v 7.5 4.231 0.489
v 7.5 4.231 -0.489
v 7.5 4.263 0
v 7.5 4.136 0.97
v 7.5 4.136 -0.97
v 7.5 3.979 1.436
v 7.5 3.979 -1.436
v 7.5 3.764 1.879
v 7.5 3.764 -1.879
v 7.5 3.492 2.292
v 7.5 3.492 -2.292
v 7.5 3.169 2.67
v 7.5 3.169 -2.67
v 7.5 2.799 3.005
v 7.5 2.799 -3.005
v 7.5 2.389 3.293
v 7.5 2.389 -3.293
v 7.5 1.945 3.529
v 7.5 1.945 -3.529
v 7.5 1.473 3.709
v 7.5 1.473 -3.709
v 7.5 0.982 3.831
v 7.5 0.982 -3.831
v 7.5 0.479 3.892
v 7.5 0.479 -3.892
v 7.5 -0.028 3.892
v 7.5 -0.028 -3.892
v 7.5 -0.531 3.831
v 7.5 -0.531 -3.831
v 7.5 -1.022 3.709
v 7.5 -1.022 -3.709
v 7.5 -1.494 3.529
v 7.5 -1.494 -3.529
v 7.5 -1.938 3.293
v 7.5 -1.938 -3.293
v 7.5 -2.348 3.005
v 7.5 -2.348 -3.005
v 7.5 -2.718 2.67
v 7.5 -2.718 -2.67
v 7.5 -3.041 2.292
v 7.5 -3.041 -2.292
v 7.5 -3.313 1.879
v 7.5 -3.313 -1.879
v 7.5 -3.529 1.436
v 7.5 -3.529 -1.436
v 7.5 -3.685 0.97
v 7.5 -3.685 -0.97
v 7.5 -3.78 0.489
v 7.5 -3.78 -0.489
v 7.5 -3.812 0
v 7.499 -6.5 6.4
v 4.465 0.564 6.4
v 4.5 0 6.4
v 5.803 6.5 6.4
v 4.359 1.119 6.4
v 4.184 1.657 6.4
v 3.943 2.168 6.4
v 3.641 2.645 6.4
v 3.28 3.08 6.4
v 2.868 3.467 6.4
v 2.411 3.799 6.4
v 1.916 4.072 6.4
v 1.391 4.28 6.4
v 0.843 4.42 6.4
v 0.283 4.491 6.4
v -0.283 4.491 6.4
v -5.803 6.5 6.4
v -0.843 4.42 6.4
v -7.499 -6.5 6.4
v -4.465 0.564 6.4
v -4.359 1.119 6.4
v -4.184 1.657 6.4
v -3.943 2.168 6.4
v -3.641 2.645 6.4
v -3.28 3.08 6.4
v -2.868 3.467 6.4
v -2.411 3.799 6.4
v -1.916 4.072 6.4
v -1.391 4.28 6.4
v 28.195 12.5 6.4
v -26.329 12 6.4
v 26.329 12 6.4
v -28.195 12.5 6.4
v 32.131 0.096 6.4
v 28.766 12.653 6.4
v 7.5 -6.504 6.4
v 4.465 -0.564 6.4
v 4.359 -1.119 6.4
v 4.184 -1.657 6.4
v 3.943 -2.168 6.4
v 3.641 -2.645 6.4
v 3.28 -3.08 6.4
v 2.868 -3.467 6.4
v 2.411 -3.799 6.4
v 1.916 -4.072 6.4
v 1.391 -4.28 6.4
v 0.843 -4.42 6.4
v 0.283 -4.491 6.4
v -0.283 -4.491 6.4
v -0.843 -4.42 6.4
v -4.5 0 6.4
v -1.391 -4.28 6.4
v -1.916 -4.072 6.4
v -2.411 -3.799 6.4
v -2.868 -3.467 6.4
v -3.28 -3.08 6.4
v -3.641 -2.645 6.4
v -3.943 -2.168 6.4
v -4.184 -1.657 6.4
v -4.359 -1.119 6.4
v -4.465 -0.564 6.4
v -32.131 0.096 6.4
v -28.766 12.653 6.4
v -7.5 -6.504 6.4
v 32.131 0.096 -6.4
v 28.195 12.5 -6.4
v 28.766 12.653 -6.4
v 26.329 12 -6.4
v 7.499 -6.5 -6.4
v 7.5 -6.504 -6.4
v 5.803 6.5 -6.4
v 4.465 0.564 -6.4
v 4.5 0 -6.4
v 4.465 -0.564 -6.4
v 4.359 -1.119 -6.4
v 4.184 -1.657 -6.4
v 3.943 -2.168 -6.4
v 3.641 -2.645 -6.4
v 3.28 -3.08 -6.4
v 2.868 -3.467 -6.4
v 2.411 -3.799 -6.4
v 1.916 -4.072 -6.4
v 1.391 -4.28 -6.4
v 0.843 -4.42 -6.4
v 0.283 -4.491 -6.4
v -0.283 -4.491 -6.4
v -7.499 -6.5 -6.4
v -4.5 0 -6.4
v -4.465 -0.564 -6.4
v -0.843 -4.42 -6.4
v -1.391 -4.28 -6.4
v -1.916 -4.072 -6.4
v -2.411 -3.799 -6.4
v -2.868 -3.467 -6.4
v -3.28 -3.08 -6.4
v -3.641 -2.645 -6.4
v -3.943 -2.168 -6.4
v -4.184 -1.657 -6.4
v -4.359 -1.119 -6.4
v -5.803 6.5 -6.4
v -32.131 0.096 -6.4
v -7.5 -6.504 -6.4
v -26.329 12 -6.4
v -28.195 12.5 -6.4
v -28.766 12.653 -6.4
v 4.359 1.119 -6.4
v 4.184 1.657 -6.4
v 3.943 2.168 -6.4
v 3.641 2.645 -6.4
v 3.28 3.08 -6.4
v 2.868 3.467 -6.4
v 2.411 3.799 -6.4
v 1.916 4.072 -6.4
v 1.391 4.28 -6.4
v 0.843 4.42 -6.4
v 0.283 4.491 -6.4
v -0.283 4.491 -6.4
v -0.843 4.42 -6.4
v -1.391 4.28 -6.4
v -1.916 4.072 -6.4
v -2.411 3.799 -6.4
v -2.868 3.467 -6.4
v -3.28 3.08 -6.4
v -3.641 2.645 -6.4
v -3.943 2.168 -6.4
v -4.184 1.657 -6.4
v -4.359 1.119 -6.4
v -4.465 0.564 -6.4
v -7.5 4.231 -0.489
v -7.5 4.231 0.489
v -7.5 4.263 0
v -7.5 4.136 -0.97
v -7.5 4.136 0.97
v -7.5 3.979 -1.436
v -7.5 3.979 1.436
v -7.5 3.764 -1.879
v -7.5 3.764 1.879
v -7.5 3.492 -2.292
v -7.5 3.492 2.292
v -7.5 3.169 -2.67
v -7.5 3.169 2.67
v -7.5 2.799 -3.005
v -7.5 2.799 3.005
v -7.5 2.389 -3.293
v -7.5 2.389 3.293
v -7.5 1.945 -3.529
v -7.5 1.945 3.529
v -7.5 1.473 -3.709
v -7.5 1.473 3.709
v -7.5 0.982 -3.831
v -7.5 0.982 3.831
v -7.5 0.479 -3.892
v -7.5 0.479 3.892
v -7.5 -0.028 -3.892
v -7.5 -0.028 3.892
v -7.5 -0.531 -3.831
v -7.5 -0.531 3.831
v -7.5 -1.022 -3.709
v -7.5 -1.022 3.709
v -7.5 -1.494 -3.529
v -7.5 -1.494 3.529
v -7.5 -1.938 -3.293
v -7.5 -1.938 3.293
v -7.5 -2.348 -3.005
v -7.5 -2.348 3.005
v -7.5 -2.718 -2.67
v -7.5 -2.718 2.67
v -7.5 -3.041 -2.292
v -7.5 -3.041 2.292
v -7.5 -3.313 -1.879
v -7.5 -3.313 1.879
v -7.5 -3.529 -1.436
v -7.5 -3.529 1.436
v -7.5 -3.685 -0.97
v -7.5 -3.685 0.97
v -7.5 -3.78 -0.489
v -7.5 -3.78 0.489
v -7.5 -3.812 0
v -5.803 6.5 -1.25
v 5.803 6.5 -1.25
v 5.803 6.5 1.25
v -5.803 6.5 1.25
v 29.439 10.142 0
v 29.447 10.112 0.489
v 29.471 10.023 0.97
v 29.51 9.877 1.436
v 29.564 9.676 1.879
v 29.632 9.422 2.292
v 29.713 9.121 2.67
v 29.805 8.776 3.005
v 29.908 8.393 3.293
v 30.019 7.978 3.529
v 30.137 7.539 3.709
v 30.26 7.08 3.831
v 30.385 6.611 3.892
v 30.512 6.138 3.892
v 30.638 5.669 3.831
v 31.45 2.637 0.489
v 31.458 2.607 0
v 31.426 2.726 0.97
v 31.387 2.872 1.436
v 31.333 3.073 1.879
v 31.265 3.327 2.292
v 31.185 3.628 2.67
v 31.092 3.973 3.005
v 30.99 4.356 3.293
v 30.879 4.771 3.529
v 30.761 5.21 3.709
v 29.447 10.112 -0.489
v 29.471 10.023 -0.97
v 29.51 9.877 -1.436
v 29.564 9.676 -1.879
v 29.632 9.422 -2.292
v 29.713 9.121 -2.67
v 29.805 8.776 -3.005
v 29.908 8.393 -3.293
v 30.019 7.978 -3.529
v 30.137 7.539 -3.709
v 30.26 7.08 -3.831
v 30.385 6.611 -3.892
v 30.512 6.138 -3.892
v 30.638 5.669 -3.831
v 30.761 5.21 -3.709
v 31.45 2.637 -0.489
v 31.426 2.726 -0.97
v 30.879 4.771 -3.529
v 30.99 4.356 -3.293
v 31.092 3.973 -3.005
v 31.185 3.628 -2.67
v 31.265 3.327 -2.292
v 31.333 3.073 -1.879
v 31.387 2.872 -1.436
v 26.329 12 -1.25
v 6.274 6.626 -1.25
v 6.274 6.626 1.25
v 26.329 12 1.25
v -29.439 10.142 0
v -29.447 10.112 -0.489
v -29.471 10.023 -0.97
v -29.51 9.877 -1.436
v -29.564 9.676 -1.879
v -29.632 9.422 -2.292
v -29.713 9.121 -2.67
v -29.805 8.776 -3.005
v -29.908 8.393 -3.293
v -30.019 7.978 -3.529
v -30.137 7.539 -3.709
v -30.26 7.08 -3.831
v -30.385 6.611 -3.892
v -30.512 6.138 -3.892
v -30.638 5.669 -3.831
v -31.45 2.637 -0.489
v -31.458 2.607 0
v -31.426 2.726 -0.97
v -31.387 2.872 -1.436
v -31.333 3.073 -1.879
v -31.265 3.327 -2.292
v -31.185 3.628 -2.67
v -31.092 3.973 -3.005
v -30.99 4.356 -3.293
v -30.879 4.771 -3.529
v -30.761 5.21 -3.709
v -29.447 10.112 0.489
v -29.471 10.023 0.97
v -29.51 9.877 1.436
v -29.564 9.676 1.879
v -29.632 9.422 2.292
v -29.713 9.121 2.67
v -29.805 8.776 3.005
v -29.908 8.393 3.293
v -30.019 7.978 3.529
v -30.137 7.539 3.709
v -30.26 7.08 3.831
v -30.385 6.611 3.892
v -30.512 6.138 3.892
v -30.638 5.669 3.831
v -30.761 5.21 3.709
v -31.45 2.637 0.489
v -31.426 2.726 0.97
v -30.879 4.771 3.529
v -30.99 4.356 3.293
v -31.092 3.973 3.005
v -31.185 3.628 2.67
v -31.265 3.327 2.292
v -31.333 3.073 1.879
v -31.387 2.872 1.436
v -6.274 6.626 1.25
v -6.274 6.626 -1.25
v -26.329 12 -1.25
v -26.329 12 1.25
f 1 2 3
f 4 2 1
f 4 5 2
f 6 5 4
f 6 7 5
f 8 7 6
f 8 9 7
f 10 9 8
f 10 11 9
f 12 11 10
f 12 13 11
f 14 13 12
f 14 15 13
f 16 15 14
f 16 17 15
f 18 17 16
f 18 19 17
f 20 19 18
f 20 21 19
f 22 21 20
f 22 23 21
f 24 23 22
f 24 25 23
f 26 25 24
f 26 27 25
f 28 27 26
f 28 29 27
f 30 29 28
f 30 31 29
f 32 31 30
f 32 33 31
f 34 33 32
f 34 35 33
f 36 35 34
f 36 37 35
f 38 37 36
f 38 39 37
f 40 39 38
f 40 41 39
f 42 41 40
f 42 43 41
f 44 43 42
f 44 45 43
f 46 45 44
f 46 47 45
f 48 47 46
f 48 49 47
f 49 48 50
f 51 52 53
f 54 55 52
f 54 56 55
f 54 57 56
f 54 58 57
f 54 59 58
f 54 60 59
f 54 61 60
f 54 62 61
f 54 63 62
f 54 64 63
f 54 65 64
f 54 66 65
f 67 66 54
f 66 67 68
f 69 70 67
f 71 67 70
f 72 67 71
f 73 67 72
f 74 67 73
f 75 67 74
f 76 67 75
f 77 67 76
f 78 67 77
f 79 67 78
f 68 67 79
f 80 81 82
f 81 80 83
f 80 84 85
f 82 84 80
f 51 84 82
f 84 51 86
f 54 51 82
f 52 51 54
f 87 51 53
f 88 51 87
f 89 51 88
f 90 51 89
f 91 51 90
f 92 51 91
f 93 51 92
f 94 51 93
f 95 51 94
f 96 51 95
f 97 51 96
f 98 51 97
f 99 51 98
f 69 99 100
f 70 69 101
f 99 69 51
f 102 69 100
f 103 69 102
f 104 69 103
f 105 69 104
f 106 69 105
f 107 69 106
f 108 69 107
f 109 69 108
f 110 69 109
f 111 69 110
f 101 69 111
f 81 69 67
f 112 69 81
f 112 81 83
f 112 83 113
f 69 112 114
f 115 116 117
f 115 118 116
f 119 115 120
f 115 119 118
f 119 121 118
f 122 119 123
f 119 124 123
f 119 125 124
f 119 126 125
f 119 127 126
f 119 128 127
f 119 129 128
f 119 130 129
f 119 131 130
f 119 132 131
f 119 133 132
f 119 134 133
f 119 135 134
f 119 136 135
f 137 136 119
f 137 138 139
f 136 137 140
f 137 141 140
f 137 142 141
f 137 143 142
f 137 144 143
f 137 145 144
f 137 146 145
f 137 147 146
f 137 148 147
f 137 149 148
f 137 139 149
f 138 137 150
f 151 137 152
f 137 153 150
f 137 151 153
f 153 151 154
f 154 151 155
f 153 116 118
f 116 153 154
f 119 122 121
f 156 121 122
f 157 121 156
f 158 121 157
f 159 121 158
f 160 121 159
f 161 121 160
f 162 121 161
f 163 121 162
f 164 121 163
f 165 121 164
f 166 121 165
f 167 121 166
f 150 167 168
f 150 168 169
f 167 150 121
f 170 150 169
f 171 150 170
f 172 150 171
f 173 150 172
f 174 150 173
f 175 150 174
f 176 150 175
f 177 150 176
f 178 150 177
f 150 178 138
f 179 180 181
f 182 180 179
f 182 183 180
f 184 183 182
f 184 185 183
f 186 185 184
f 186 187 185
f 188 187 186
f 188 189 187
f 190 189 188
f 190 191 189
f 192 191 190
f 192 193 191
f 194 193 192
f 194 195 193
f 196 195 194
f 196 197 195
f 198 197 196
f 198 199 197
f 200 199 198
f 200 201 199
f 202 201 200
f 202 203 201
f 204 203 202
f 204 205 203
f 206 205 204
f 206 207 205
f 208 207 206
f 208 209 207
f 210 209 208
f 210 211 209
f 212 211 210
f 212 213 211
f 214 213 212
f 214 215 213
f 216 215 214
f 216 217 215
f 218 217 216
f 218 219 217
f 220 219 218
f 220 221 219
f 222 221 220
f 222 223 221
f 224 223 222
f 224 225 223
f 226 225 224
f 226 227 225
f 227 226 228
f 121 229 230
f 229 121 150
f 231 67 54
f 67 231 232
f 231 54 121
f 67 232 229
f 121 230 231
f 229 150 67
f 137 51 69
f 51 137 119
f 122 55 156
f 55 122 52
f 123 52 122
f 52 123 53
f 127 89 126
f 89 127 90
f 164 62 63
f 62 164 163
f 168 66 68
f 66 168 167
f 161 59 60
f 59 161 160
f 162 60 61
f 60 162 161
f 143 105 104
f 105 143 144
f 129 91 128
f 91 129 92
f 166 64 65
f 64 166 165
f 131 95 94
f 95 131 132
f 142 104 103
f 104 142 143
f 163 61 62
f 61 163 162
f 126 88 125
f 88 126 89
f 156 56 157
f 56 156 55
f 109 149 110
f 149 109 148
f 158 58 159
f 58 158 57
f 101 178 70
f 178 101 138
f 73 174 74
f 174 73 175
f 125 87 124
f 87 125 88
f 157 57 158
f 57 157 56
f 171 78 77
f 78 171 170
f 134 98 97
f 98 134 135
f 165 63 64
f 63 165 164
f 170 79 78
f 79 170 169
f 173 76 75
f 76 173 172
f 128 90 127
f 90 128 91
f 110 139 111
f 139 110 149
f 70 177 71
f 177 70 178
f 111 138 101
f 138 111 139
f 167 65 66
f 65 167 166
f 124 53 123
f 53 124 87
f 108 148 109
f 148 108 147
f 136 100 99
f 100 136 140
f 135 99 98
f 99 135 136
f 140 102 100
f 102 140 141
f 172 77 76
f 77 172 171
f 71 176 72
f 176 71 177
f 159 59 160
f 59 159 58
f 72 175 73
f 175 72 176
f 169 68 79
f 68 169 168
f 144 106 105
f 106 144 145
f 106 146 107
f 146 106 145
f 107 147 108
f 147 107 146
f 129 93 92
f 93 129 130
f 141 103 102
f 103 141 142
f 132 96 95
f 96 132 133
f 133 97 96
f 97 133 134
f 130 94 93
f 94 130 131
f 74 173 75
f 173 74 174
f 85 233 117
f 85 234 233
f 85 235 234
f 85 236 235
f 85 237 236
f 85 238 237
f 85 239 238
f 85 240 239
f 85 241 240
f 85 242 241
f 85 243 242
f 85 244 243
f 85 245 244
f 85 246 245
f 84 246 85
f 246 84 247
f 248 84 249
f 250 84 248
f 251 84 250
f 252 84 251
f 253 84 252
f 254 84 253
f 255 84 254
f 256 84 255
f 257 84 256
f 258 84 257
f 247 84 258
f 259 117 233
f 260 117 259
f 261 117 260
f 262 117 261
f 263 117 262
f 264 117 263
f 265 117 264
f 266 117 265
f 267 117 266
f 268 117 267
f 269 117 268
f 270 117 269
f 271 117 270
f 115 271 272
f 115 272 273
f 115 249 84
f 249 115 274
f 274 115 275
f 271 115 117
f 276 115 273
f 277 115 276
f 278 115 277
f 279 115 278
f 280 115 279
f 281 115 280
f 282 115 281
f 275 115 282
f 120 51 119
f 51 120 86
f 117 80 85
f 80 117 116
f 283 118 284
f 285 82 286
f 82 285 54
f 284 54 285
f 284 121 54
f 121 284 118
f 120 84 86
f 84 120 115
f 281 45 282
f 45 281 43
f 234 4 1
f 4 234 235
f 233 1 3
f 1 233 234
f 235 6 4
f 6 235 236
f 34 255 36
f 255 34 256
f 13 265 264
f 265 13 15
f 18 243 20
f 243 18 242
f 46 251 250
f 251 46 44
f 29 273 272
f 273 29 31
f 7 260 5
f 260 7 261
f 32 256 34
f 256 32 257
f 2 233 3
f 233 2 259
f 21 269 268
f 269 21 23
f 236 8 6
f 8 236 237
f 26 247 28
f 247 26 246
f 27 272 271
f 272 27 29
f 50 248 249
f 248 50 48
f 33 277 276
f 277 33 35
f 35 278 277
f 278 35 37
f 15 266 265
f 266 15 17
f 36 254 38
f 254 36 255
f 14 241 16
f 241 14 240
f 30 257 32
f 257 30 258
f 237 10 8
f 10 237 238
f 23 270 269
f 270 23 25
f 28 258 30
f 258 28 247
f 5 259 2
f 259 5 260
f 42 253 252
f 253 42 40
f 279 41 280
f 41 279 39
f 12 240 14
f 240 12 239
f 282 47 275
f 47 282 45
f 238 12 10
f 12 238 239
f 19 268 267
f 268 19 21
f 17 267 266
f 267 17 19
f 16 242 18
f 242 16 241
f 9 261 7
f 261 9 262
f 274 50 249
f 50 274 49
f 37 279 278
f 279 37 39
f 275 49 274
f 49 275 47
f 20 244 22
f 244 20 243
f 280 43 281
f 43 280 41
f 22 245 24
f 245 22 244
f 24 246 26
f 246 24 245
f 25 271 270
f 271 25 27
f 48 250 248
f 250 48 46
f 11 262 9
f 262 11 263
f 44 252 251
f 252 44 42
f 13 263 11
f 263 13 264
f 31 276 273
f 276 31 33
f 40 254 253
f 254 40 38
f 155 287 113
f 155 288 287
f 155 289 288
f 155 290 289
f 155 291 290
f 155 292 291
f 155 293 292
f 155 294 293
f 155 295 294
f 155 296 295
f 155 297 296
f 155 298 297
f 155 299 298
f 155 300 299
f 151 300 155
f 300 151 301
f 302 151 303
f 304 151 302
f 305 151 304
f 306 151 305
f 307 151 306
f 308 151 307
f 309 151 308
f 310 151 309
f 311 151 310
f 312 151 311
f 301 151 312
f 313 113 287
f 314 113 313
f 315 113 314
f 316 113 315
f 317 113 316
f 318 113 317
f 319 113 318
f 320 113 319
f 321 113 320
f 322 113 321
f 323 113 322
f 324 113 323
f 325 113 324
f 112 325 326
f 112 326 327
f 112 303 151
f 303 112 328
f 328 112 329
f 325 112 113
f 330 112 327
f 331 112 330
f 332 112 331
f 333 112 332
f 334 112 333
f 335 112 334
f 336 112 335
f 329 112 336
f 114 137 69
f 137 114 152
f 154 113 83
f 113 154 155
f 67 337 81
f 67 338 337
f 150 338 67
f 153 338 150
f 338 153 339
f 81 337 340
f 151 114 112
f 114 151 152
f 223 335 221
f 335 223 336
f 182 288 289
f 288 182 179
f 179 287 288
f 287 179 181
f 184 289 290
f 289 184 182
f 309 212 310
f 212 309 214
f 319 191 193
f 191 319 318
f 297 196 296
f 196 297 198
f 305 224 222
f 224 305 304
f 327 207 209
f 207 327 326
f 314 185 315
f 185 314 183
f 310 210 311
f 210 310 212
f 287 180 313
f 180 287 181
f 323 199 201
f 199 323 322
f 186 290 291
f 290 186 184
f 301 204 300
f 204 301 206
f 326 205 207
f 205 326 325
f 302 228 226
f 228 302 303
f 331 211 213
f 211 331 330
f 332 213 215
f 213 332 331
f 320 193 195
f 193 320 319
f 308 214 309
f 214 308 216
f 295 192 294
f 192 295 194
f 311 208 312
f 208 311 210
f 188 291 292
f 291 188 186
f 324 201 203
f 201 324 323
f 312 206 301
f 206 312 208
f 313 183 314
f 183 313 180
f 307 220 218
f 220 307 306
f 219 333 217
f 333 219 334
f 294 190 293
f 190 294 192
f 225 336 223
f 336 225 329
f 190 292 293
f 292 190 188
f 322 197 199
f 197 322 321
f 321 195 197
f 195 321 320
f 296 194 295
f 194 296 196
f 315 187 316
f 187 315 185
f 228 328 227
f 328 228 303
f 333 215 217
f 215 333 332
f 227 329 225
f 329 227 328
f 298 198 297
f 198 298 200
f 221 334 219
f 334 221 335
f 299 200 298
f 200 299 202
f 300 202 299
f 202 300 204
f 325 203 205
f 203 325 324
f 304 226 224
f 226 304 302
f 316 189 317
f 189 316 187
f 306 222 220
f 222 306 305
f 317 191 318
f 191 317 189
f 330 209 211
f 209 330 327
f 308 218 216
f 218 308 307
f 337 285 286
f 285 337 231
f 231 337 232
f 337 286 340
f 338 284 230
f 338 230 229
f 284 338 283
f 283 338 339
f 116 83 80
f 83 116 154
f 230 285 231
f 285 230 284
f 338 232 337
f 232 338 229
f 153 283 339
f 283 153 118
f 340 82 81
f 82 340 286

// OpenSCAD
// Diameter of the hole for the kite's spine
spine_hole_diameter = 9;
// Length of the "horizontal" section through which the spine goes
spine_length = 15;
// Diameter of the holes in the "arms"
arm_hole_diameter = 8.8;
// Minimum wall thickness (hole to outer edge)
wall_thickness = 2;
// Length of the "arms"
arm_length = 25.5;
// Depth of webbing between the arms (measured outwards from the "horizontal" section)
webbing_depth = 6;
// Thickness of the webbing
webbing_thickness = 2.5;

height = arm_hole_diameter + (wall_thickness * 2);
depth = max(arm_hole_diameter, spine_hole_diameter) + (wall_thickness * 2);
arm_offset_w = (((arm_length * sin(75)) - (depth * sin(15))) + spine_length) / 2;
arm_depth_extra = (((depth * sin(15)) / sin(75)) * sin(15)) / 2;
arm_offset_d = ((arm_length * sin(15)) - arm_depth_extra) / 2;
webbing_offset = (webbing_depth + depth) / 2;
webbing_flat_offset = webbing_offset + (webbing_depth / 2) - 0.25;
webbing_inseam = (arm_length * sin(75)) - (depth * sin(15));
webbing_length = webbing_inseam * 2 + spine_length;

echo(webbing_length);

// middle section
difference() {
	cube([spine_length, depth, height], center=true);
	cylinder(d=spine_hole_diameter, h=height, $fn=50, center=true);
}

// arms - 15deg angle
translate([arm_offset_w, arm_offset_d, 0]) rotate([0, 0, 15]) arm();
translate([-arm_offset_w, arm_offset_d, 0]) rotate([0, 180, -15]) arm();

// webbing
difference() {
	translate([0, webbing_offset, 0]) cube([webbing_length, webbing_depth, webbing_thickness], center=true);
	translate([arm_offset_w, arm_offset_d, 0]) rotate([0, 0, 15]) cube([arm_length, depth, 10], center=true);
	translate([-arm_offset_w, arm_offset_d, 0]) rotate([0, 180, -15]) cube([arm_length, depth, 10], center=true);
}
translate([0, webbing_flat_offset, 0]) cube([webbing_length, 0.5, height], center=true);

module arm() {
	difference() {
		cube([arm_length, depth, height], center=true);
		rotate([90, 0, 90]) cylinder(d=7.8, h=arm_length + 0.1, $fn=50, center=true);
	}
}
